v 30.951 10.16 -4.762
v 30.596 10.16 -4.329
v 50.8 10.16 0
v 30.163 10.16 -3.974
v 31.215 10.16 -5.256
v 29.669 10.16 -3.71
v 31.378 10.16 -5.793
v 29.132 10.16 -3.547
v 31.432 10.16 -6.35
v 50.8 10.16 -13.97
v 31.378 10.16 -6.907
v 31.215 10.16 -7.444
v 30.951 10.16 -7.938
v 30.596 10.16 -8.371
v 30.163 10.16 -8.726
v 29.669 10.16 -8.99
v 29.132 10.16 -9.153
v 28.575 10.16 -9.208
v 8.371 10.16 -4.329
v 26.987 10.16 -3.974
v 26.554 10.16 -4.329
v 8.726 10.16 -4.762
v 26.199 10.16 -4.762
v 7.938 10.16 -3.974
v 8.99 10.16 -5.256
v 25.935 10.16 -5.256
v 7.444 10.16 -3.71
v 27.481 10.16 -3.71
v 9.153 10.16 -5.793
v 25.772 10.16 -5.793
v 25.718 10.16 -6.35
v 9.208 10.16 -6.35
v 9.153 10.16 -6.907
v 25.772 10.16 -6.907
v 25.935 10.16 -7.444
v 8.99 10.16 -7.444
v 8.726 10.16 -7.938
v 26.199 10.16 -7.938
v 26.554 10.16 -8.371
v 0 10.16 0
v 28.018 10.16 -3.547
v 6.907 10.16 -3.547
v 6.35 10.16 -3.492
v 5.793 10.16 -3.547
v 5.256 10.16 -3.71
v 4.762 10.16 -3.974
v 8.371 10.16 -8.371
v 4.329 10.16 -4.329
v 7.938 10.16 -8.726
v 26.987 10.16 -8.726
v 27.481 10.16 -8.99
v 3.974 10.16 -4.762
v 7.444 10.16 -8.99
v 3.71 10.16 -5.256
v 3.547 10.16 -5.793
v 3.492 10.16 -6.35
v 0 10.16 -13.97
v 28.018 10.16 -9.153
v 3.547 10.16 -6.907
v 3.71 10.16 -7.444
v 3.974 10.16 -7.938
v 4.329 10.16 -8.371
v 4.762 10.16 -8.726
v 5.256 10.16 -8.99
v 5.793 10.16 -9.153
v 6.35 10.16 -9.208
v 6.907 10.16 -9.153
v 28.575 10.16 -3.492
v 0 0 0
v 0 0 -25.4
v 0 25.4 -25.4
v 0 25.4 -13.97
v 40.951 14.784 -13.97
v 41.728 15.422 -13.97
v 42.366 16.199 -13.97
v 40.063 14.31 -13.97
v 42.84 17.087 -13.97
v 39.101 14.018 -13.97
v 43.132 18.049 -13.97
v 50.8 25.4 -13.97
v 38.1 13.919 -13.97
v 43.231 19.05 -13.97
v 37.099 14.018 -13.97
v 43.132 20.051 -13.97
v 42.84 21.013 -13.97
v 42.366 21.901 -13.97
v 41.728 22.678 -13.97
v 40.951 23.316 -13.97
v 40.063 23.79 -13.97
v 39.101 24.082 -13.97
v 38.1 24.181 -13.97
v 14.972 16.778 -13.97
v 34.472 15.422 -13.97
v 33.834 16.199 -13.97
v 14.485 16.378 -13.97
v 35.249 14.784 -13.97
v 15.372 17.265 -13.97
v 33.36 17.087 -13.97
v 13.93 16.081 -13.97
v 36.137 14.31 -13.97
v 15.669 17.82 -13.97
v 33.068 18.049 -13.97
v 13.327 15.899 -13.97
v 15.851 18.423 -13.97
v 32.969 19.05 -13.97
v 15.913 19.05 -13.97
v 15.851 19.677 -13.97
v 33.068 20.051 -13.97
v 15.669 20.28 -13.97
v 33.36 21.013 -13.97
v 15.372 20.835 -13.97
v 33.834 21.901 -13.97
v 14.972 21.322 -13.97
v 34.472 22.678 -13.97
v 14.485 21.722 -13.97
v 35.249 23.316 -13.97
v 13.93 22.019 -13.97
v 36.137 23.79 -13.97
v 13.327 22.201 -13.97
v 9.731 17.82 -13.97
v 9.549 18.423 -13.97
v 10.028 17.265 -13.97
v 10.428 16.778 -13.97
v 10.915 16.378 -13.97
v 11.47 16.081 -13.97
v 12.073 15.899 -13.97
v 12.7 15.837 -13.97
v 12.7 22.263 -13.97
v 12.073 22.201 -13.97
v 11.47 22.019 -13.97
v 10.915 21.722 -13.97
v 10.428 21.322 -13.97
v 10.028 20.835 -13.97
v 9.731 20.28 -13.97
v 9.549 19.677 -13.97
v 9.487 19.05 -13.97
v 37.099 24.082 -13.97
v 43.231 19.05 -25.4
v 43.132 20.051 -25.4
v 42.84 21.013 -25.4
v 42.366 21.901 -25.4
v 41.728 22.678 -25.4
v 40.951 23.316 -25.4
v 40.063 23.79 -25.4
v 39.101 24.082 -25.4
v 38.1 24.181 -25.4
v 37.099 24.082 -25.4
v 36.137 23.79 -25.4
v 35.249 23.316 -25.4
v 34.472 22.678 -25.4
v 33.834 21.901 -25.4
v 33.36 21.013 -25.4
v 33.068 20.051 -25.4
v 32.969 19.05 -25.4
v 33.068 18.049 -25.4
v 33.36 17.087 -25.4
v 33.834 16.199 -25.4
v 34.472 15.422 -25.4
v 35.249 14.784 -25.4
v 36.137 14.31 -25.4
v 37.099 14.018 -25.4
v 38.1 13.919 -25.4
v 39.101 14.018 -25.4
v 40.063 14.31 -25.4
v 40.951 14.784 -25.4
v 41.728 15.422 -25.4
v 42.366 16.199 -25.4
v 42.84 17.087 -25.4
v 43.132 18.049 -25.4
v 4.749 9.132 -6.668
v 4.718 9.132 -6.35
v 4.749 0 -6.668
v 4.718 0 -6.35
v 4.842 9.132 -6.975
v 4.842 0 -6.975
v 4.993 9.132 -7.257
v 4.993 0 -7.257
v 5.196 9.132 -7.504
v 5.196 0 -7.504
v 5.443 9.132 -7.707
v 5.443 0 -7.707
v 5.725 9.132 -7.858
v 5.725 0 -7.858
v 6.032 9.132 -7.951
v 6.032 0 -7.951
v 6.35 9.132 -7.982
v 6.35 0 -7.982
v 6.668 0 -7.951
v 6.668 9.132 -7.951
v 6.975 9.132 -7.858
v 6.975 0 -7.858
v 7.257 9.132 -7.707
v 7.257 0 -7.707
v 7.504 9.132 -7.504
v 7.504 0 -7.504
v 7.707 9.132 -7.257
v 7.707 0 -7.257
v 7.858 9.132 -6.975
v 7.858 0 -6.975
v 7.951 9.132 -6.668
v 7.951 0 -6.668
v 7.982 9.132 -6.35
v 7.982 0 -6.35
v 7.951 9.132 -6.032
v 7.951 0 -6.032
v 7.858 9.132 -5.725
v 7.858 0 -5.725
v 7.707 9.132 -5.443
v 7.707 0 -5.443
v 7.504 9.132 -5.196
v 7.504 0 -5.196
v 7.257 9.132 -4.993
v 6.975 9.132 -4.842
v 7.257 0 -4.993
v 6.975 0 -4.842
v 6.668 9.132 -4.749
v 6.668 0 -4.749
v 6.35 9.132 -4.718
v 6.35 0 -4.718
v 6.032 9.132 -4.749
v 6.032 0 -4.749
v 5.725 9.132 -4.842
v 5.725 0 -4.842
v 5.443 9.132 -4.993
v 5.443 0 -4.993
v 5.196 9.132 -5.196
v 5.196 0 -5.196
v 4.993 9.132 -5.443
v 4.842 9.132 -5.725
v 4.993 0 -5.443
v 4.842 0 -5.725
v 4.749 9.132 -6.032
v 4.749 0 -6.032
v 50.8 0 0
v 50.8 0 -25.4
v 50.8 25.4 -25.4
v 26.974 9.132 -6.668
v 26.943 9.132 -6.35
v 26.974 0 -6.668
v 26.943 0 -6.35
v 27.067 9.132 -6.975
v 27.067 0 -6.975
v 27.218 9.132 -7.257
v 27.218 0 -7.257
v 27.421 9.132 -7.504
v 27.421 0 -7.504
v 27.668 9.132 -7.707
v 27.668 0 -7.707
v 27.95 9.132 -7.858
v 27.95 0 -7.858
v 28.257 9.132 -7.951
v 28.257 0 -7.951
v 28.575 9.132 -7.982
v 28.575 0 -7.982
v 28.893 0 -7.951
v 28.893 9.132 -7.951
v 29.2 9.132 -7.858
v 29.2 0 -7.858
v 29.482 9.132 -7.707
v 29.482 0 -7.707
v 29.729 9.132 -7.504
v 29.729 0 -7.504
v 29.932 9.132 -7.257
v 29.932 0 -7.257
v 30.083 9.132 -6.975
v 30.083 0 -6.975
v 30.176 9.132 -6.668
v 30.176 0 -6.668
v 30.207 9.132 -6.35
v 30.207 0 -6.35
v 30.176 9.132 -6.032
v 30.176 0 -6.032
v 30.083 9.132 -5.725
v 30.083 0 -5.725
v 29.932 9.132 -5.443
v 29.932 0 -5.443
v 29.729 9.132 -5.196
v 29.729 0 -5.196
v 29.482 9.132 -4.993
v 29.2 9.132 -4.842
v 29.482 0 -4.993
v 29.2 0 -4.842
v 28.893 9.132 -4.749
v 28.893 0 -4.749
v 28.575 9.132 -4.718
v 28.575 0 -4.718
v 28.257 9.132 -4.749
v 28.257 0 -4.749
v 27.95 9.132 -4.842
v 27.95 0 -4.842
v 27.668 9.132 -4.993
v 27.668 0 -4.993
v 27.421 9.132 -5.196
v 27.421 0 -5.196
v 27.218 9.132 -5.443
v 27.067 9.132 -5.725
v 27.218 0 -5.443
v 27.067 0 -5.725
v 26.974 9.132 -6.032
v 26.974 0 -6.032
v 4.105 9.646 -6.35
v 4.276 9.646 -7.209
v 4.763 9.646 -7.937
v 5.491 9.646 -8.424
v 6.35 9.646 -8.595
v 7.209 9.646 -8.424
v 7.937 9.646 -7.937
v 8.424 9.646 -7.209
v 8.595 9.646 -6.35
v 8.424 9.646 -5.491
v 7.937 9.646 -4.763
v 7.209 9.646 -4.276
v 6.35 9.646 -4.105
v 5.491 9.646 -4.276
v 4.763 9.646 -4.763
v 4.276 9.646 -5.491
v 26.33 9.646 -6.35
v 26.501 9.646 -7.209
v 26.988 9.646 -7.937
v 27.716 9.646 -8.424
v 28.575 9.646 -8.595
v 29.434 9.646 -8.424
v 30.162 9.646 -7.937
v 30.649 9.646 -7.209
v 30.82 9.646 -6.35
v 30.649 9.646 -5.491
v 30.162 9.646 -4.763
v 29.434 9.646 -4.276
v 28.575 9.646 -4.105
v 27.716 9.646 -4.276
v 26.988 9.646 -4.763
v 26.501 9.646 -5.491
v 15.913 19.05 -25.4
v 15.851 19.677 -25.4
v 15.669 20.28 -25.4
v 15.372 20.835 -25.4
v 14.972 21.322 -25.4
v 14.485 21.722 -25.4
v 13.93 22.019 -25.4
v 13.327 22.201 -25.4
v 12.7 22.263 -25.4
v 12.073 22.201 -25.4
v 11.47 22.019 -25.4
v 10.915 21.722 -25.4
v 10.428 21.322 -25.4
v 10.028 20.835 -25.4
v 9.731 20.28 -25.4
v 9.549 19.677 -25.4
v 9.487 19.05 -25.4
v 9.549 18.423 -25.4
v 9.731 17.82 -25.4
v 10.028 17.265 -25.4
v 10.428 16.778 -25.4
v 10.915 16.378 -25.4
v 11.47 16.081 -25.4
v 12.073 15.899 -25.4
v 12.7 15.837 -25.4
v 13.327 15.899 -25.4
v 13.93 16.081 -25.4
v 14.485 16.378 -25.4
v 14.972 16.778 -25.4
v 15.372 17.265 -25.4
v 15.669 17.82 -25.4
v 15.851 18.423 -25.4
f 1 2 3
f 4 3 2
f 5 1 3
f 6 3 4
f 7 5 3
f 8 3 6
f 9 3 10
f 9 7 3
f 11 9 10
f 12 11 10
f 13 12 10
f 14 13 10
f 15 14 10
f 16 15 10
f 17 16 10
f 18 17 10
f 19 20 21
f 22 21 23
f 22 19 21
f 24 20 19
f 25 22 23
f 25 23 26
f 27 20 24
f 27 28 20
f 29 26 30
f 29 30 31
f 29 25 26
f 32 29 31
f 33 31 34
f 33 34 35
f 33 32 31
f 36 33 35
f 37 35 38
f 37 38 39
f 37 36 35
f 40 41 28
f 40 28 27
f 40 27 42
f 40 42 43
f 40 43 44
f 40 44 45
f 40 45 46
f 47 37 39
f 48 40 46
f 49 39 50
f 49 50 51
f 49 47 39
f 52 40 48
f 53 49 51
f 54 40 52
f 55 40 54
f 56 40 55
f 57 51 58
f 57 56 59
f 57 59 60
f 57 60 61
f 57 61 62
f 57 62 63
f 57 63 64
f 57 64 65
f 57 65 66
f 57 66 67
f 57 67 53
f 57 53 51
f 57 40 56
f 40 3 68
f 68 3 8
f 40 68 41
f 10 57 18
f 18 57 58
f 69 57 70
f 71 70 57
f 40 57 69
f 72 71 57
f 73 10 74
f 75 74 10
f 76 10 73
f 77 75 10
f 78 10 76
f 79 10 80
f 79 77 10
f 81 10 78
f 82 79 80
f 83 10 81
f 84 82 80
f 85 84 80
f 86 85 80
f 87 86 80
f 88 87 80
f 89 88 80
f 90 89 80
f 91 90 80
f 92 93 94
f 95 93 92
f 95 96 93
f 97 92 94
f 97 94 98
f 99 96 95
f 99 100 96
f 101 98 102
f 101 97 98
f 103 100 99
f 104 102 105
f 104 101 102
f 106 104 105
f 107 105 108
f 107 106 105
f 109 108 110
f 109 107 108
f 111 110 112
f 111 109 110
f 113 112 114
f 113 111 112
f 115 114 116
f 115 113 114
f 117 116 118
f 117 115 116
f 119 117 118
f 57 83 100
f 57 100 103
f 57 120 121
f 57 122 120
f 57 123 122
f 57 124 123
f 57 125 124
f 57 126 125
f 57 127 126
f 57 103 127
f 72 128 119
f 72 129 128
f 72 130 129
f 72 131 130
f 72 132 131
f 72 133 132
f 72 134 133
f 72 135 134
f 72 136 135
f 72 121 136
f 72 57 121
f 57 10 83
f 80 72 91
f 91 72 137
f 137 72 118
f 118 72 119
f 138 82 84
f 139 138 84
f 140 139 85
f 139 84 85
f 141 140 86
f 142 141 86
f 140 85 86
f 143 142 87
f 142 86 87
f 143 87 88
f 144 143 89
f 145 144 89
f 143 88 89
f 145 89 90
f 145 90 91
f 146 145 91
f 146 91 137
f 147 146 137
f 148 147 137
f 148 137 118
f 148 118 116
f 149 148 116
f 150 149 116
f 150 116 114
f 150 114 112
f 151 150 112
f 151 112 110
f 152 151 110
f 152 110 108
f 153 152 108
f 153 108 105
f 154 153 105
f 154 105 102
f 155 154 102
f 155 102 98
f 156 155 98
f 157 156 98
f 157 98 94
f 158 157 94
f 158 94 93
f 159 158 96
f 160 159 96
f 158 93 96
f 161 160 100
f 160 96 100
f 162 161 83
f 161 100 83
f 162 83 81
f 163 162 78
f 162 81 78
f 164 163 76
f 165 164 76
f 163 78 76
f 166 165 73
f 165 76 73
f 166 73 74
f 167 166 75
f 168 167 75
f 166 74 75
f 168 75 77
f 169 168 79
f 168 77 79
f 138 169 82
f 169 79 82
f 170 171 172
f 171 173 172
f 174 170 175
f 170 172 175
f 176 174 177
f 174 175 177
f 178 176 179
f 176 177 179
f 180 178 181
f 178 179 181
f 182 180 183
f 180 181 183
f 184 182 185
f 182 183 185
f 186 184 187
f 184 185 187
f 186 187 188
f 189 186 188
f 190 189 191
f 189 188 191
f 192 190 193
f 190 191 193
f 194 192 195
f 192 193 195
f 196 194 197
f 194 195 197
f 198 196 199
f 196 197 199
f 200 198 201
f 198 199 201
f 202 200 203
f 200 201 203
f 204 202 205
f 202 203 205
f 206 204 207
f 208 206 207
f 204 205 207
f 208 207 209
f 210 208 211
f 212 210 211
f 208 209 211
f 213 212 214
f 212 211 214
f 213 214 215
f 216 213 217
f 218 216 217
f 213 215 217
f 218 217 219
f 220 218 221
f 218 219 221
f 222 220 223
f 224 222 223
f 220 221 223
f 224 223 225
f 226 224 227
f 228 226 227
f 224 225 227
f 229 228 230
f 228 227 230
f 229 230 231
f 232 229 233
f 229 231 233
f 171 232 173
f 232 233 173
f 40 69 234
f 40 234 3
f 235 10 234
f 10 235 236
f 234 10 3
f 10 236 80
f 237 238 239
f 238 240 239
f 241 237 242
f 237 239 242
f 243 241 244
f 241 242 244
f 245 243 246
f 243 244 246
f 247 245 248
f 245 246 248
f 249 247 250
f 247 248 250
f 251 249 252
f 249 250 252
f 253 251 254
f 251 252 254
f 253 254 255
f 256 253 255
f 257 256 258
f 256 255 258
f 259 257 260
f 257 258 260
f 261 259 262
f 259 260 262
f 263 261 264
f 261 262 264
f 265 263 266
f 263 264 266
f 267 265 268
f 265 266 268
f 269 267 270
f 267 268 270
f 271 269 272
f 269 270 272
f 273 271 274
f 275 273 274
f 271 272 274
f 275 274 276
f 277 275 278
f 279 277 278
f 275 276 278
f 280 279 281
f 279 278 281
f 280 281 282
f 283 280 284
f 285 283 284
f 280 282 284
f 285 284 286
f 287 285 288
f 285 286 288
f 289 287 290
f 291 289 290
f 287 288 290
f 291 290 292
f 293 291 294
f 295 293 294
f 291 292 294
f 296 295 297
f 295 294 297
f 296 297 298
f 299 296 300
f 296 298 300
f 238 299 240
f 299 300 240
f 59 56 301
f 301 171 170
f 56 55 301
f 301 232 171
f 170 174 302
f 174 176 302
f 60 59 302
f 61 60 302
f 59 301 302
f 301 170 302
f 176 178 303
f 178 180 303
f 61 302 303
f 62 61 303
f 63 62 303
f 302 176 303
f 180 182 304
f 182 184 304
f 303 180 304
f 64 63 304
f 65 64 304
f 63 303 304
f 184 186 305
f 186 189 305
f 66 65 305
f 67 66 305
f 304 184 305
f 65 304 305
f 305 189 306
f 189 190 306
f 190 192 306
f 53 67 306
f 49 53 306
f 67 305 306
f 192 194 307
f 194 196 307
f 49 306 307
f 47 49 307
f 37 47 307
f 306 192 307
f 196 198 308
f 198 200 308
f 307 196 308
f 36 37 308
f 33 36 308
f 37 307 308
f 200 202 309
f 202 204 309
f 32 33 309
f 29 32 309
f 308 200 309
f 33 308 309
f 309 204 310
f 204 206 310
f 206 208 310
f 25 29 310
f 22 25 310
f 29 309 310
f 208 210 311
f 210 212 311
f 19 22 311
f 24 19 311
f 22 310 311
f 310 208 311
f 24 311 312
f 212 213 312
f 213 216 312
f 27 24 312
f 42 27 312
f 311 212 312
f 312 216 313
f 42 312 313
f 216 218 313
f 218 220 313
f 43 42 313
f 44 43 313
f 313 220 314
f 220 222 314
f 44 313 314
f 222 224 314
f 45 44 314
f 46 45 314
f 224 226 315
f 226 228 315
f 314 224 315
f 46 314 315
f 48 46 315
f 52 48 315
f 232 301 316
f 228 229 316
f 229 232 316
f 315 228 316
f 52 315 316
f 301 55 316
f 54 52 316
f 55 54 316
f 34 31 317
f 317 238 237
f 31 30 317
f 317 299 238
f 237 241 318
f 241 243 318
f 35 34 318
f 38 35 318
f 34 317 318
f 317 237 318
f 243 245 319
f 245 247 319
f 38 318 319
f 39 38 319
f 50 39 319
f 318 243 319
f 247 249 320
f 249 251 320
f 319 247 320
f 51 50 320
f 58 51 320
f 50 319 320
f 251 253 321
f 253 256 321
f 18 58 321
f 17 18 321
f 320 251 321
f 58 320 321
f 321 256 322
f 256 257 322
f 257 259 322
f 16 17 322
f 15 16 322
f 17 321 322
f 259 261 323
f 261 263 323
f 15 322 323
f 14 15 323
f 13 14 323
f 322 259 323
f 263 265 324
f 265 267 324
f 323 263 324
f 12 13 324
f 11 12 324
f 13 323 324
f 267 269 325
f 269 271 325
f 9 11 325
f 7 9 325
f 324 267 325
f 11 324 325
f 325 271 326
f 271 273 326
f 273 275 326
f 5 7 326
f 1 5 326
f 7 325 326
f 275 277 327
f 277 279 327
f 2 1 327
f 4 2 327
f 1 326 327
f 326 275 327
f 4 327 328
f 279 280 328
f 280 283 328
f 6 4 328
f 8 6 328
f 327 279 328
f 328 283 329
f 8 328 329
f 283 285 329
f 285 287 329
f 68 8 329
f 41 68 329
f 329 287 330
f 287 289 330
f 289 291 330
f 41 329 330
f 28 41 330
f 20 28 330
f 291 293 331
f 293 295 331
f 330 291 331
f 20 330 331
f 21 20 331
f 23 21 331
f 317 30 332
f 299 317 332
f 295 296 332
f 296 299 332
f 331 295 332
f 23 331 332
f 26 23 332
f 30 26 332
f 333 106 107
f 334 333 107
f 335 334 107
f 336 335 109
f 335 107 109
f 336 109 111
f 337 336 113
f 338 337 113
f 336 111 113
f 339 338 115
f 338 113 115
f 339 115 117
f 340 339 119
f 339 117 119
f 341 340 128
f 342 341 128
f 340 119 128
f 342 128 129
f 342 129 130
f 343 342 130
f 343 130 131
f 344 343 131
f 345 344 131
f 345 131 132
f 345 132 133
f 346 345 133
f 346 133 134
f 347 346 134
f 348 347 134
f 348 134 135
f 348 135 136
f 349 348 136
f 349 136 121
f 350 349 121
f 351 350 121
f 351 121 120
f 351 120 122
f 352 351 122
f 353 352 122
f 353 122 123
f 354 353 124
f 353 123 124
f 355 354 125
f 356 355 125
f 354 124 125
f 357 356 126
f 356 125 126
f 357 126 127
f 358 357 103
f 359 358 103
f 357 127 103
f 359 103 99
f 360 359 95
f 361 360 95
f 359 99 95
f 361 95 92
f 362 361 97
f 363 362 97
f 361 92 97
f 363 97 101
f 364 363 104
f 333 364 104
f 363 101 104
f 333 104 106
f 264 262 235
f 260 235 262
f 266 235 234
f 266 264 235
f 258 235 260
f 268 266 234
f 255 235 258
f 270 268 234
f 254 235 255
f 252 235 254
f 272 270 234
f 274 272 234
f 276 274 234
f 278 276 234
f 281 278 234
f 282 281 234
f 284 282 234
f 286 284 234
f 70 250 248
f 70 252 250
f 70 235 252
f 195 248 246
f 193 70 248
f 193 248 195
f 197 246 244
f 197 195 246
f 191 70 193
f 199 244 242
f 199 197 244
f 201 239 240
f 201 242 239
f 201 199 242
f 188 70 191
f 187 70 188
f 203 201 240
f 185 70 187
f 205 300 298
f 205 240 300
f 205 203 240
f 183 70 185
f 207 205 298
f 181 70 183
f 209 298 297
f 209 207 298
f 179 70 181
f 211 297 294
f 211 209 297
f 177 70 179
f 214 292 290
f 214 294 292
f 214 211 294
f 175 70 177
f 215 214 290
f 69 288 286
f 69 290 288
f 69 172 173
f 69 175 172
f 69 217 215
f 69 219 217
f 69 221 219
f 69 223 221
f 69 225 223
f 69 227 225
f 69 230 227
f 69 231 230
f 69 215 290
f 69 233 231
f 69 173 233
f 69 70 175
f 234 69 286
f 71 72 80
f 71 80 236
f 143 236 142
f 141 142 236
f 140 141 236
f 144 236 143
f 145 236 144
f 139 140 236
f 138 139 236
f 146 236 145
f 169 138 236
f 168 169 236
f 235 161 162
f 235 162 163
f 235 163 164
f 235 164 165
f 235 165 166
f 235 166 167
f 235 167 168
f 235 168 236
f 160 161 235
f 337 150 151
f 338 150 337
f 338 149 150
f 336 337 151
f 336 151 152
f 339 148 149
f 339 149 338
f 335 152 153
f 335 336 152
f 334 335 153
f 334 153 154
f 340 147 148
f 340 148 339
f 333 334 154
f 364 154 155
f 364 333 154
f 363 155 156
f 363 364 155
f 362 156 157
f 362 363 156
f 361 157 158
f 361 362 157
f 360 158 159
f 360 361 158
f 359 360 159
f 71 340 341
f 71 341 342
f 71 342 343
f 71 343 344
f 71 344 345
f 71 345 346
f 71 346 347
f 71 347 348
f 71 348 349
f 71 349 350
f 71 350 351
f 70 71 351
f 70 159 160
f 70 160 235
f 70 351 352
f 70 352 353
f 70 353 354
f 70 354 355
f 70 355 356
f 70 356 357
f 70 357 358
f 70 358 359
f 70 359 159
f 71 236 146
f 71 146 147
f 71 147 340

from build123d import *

# Parameters (mm, degrees)
BOSS_EXTRUDE1_DEPTH                               = 50.8
SKETCH3_R                                         = 3.2131
CUT_EXTRUDE1_DEPTH                                = 59.488981014
CSK_FOR_4_FLAT_HEAD_MACHINE_SCREW_100_D           = 3.2639
CSK_FOR_4_FLAT_HEAD_MACHINE_SCREW_100_CSINK_D     = 5.715
CSK_FOR_4_FLAT_HEAD_MACHINE_SCREW_100_CSINK_ANGLE = 100
Y_0_404_DIAMETER_HOLE1_D                          = 10.2616


with BuildPart() as part:
    # Sketch2 → Boss-Extrude1 (new body)
    with BuildSketch(Plane(origin=(0, 0, 0), x_dir=(0, 0, -1), z_dir=(1, 0, 0))):
        Polygon((0, 0), (0, 10.16), (13.97, 10.16), (13.97, 25.4), (25.4, 25.4), (25.4, 0), align=None)
    extrude(amount=BOSS_EXTRUDE1_DEPTH)

    # Sketch3 → Cut-Extrude1 (cut, through all)
    with BuildSketch(Plane.XY.offset(-13.97)):
        with Locations((12.7, 19.05)):
            Circle(SKETCH3_R)
    extrude(amount=-CUT_EXTRUDE1_DEPTH, mode=Mode.SUBTRACT)

    # CSK for #4 Flat Head Machine Screw (100)1 (through all)
    with Locations(Plane(origin=(0, 10.16, 0), x_dir=(1, 0, 0), z_dir=(0, 1, 0))):
        with Locations((6.35, 6.35), (28.575, 6.35)):
            CounterSinkHole(CSK_FOR_4_FLAT_HEAD_MACHINE_SCREW_100_D / 2, CSK_FOR_4_FLAT_HEAD_MACHINE_SCREW_100_CSINK_D / 2, counter_sink_angle=CSK_FOR_4_FLAT_HEAD_MACHINE_SCREW_100_CSINK_ANGLE)

    # Y (0.404) Diameter Hole1 (through all)
    with Locations(Plane(origin=(0, 0, -25.4), x_dir=(-1, 0, 0), z_dir=(0, 0, -1))):
        with Locations((-38.1, 19.05)):
            Hole(Y_0_404_DIAMETER_HOLE1_D / 2)


solid = part.part
